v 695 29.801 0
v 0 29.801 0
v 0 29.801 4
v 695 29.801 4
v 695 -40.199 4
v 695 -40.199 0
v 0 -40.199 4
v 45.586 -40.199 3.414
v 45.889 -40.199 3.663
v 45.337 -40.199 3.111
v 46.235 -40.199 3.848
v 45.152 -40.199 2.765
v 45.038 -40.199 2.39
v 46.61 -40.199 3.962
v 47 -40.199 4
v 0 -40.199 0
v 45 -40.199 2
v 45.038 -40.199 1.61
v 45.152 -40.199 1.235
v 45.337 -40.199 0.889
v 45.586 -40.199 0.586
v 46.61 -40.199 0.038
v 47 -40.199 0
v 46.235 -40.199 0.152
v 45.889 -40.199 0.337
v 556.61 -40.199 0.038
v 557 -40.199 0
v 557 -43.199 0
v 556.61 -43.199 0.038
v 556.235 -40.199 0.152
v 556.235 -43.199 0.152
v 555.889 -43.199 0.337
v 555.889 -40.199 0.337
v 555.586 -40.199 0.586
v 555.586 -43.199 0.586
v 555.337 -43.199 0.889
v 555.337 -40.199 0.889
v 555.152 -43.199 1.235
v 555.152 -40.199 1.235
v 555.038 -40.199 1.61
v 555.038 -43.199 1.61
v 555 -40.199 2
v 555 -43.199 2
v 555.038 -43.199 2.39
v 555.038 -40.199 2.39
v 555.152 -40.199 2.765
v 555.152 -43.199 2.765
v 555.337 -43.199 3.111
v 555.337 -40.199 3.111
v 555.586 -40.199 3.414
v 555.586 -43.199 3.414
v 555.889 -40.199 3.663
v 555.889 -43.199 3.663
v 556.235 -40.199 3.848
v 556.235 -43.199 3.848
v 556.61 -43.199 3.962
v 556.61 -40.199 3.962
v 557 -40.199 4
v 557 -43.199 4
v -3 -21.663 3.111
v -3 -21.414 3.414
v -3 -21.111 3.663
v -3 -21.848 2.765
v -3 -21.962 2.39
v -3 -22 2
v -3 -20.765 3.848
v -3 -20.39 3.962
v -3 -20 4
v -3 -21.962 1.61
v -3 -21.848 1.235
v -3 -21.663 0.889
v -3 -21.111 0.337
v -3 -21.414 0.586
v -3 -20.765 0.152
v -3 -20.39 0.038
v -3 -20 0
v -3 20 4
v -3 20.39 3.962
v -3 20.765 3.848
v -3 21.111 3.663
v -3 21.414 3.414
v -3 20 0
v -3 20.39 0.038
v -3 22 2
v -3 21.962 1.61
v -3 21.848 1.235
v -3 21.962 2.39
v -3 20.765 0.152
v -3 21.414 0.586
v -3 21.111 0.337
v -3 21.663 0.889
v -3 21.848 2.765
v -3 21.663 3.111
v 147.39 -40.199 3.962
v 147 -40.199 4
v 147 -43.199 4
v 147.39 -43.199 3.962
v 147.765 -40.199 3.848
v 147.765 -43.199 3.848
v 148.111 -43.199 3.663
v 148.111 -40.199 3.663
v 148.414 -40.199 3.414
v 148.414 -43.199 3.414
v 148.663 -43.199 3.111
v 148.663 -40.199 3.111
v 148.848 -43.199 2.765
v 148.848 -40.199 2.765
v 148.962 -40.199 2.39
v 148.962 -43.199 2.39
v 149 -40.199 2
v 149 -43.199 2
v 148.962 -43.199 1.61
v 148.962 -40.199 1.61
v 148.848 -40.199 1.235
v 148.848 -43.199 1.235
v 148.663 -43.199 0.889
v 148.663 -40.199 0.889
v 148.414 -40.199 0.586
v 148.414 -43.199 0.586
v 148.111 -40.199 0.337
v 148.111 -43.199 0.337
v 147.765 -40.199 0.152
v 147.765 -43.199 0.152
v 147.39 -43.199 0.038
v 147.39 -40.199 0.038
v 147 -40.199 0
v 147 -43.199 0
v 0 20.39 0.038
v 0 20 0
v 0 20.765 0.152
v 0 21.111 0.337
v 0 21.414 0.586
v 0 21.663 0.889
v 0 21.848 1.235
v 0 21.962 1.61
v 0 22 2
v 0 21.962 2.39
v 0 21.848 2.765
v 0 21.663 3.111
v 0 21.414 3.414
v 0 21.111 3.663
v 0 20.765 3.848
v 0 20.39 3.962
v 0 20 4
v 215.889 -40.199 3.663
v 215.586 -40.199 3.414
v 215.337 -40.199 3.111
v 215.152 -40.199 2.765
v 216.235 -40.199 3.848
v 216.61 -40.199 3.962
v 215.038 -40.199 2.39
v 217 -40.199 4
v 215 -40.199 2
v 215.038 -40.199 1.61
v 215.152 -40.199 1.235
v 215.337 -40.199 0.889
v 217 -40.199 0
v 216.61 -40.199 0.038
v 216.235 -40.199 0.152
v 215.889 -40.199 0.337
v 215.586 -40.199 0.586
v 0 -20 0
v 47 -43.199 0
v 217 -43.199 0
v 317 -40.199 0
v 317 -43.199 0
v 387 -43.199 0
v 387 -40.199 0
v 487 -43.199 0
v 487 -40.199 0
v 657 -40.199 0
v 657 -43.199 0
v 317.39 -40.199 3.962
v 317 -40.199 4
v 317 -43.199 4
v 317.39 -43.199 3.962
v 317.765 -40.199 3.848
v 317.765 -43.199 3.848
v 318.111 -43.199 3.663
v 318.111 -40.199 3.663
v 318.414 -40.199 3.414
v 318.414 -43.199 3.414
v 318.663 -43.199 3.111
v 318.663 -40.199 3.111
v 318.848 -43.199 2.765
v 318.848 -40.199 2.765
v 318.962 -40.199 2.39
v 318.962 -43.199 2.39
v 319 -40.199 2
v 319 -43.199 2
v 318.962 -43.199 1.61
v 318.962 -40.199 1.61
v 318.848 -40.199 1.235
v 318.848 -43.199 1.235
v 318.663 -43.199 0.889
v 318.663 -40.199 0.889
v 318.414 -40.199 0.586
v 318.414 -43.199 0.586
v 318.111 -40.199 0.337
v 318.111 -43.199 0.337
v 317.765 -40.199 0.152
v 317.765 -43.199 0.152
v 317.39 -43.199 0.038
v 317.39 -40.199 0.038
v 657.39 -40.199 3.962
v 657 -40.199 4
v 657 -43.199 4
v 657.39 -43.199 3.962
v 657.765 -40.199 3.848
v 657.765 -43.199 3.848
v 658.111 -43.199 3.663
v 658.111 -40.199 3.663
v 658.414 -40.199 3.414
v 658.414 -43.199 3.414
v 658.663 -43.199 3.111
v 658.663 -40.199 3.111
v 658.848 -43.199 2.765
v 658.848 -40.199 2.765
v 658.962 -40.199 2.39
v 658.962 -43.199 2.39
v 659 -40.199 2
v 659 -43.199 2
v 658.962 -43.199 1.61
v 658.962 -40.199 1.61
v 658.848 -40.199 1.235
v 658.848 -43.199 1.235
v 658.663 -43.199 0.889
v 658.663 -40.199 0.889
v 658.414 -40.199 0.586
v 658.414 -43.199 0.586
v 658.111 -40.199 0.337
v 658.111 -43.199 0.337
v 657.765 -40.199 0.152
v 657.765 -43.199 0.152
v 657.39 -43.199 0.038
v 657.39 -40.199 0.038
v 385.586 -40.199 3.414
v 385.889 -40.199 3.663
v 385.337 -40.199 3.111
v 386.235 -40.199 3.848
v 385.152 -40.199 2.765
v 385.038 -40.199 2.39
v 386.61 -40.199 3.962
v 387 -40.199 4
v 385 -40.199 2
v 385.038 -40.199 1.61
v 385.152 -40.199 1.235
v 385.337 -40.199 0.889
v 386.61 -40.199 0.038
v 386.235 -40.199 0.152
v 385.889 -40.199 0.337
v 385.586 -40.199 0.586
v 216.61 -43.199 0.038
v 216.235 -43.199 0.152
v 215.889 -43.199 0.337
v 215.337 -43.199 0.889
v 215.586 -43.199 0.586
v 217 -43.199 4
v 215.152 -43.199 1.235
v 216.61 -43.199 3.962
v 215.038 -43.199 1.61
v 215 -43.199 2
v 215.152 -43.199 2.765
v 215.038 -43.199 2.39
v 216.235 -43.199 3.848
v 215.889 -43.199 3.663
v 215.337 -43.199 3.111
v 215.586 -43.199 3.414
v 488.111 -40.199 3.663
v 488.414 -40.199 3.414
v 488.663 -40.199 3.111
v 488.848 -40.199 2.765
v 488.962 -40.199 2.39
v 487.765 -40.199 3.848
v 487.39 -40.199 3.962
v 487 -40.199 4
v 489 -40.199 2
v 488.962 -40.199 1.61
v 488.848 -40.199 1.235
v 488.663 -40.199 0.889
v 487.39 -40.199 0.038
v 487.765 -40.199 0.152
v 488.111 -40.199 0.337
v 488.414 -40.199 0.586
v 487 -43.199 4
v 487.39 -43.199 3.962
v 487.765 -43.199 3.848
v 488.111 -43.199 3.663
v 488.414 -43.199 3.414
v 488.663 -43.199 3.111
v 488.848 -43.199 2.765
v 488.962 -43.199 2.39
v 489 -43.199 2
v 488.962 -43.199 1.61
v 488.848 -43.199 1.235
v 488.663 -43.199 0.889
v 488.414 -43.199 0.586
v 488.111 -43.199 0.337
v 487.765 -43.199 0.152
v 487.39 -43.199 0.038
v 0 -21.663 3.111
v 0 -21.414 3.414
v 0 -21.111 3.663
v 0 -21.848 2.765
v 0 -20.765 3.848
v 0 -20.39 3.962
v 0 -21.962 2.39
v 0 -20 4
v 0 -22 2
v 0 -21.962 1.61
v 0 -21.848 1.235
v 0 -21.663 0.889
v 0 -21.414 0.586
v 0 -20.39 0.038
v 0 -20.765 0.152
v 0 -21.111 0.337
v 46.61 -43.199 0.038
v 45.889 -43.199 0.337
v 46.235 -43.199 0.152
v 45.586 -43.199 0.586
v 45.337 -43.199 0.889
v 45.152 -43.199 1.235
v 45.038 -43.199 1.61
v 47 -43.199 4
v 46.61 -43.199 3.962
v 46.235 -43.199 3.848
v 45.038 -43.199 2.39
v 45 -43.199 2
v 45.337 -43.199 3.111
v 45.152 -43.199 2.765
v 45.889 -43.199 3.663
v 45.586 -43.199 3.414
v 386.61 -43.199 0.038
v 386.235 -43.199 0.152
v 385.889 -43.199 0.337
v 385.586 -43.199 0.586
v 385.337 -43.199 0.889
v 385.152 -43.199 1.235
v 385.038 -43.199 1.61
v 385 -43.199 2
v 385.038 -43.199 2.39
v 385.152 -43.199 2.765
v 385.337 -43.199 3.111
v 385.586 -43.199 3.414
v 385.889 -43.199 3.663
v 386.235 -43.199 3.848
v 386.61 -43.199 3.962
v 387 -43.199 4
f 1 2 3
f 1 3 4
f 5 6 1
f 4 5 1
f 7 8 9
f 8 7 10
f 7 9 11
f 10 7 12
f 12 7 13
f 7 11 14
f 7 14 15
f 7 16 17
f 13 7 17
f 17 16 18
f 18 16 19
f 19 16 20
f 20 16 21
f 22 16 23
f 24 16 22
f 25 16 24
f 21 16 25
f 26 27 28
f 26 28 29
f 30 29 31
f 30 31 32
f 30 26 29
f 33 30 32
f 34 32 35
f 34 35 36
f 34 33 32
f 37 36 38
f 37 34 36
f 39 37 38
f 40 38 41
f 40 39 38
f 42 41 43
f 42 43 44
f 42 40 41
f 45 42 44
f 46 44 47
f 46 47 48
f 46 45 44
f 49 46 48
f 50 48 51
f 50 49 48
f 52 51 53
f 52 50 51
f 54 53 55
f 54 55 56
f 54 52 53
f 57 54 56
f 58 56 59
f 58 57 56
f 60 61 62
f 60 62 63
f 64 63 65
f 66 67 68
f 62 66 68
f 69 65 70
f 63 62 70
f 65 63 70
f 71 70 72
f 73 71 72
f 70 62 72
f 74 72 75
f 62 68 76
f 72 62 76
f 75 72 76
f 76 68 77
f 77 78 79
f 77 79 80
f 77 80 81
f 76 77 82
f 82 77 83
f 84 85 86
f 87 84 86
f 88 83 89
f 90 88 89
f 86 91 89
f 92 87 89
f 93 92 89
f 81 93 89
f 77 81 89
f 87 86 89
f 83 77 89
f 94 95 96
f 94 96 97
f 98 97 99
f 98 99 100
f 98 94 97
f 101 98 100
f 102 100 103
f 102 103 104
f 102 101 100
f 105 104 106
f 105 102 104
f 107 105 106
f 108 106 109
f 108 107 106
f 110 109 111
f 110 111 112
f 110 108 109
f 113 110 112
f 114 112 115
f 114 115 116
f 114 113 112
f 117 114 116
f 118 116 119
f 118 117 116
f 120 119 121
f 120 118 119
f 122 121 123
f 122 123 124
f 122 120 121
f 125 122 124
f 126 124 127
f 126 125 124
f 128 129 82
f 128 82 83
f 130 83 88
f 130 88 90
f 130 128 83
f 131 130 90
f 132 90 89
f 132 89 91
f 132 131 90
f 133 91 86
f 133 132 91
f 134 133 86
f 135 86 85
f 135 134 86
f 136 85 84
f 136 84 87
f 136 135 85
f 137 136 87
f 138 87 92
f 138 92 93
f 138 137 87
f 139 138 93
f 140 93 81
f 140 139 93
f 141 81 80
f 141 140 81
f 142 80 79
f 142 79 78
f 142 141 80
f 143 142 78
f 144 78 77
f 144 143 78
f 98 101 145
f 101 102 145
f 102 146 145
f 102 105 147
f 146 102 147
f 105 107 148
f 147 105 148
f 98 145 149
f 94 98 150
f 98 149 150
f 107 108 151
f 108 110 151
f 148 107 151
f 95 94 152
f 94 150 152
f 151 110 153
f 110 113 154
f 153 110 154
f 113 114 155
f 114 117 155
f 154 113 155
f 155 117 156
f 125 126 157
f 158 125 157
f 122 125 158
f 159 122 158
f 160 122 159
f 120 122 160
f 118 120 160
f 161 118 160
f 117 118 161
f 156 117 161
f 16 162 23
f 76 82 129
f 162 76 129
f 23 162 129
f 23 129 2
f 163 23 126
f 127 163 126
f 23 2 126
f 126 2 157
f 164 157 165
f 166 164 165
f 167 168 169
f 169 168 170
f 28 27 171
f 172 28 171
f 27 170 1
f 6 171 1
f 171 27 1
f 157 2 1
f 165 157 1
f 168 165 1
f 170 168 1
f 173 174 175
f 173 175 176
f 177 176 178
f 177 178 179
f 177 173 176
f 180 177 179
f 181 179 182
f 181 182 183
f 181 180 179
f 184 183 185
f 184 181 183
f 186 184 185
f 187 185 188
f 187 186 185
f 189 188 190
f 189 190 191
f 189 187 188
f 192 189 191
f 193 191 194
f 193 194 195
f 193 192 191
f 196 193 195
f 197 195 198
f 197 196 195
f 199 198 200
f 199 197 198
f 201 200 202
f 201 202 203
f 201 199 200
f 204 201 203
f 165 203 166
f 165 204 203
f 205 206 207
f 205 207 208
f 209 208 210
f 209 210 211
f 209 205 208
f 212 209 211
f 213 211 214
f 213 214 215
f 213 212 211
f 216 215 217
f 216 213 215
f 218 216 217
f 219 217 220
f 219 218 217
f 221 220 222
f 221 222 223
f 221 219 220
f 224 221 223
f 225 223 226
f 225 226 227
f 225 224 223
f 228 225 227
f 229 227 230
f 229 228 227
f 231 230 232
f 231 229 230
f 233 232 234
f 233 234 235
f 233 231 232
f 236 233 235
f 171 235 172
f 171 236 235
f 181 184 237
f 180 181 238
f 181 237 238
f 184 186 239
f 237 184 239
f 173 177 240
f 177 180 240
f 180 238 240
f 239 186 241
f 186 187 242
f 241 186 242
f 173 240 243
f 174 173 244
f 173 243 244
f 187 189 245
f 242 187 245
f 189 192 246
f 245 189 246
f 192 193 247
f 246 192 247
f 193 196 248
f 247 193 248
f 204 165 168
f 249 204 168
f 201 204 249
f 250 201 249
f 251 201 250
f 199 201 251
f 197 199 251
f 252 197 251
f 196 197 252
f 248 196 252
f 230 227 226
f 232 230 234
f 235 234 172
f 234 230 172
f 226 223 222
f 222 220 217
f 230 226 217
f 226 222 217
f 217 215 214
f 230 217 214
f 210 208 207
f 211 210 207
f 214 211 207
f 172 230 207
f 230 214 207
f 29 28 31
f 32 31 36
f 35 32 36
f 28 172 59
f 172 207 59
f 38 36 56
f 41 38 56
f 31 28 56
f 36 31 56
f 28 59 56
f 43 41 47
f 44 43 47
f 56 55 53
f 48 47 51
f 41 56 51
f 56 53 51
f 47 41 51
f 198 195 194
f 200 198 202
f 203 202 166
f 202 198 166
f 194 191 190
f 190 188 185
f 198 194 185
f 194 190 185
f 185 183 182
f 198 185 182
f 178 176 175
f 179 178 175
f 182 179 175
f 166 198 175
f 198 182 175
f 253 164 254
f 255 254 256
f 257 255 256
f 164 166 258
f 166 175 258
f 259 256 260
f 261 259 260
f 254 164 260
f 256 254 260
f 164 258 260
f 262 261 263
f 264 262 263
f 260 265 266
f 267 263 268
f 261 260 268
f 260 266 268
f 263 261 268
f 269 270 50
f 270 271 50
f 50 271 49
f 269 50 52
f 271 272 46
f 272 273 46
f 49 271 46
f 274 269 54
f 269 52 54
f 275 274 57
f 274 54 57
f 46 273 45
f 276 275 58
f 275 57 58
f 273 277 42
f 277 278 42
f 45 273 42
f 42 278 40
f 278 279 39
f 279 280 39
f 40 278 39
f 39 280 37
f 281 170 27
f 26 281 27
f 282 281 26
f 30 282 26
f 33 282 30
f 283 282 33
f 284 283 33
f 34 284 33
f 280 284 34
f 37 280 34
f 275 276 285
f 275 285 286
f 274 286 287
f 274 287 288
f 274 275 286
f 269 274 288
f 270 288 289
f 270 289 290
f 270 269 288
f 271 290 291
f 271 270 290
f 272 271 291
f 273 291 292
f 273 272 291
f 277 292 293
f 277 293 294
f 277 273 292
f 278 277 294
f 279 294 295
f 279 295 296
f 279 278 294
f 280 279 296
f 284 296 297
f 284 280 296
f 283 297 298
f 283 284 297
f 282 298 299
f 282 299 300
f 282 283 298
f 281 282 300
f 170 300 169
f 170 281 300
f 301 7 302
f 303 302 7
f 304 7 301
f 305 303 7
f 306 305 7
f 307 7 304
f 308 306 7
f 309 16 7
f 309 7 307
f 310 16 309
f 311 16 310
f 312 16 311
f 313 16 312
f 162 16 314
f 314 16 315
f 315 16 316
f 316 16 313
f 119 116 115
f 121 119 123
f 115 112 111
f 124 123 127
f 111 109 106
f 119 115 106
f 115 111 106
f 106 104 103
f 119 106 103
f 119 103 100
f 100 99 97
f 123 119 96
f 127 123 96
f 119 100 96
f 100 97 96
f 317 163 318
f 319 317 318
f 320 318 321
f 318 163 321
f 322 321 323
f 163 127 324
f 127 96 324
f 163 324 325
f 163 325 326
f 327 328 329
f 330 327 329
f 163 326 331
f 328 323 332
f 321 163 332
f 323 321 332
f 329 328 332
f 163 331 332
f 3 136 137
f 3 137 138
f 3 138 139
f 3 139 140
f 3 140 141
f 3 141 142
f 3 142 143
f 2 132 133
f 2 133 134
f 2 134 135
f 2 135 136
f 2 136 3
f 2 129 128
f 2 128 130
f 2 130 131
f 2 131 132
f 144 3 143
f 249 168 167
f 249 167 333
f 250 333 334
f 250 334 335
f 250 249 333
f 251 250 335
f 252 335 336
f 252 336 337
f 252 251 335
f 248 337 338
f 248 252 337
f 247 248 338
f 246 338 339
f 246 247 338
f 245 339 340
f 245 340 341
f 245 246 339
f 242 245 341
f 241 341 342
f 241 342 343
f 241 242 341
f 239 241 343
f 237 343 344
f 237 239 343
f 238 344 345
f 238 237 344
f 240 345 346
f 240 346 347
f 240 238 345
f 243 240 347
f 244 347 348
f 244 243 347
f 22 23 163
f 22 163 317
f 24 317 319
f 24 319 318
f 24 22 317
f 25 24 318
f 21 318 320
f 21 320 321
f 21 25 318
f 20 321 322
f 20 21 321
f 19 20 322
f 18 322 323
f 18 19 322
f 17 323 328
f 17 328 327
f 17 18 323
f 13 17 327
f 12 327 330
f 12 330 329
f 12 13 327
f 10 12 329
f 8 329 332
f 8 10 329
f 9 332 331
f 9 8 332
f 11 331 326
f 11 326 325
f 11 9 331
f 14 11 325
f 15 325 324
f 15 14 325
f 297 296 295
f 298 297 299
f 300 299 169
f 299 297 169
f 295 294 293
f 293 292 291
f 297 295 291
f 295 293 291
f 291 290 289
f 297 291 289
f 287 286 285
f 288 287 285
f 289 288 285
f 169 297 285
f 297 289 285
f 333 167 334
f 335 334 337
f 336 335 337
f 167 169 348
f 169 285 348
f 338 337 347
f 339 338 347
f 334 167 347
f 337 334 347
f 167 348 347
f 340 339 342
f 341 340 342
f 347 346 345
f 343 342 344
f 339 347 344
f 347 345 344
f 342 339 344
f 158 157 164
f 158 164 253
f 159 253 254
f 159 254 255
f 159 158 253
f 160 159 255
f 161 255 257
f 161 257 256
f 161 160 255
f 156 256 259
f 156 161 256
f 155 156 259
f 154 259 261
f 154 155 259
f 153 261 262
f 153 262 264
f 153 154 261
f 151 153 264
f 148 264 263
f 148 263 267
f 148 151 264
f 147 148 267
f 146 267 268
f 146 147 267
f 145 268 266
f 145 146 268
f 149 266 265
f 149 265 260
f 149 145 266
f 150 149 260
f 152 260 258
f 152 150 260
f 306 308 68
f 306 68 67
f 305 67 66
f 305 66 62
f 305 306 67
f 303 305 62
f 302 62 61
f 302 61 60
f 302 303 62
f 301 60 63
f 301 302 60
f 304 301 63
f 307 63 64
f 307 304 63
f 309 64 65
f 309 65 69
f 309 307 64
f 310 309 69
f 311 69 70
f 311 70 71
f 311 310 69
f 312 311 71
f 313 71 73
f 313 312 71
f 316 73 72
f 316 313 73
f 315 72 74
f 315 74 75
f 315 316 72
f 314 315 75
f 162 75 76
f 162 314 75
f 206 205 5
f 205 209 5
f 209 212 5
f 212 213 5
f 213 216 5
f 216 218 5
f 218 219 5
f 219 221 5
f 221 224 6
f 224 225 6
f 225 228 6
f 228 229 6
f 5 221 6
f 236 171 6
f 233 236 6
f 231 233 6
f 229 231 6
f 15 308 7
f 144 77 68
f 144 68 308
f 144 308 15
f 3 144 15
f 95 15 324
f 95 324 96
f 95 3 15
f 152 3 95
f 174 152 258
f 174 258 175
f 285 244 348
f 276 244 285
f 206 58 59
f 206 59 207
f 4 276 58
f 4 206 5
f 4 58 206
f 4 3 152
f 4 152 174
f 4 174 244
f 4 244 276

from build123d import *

# Parameters (mm, degrees)
SKETCH_1_W      = 695
SKETCH_1_H      = 70
EXTRUDE_1_DEPTH = 4
EXTRUDE_2_DEPTH = 3
EXTRUDE_3_DEPTH = 3


with BuildPart() as part:
    # Эскиз1 → Бобышка-Вытянуть1 (new body)
    with BuildSketch(Plane.XY):
        with Locations((347.5, -5.198933607)):
            Rectangle(SKETCH_1_W, SKETCH_1_H)
    extrude(amount=EXTRUDE_1_DEPTH)

    # Эскиз2 → Бобышка-Вытянуть2 (add)
    with BuildSketch(Plane.XZ.offset(40.198933607)):
        with BuildLine():
            Line((47, 4), (147, 4))
            ThreePointArc((147, 4), (149, 2), (147, 0))
            Line((147, 0), (47, 0))
            ThreePointArc((47, 0), (45, 2), (47, 4))
        make_face()
        with BuildLine():
            Line((217, 4), (317, 4))
            ThreePointArc((317, 4), (319, 2), (317, 0))
            Line((317, 0), (217, 0))
            ThreePointArc((217, 0), (215, 2), (217, 4))
        make_face()
        with BuildLine():
            Line((387, 4), (487, 4))
            ThreePointArc((487, 4), (489, 2), (487, 0))
            Line((487, 0), (387, 0))
            ThreePointArc((387, 0), (385, 2), (387, 4))
        make_face()
        with BuildLine():
            Line((557, 4), (657, 4))
            ThreePointArc((657, 4), (659, 2), (657, 0))
            Line((657, 0), (557, 0))
            ThreePointArc((557, 0), (555, 2), (557, 4))
        make_face()
    extrude(amount=EXTRUDE_2_DEPTH)

    # Эскиз3 → Бобышка-Вытянуть3 (add)
    with BuildSketch(Plane.ZY):
        with BuildLine():
            Line((4, 20), (4, -20))
            ThreePointArc((4, -20), (2, -22), (0, -20))
            Line((0, -20), (0, 20))
            ThreePointArc((0, 20), (2, 22), (4, 20))
        make_face()
    extrude(amount=EXTRUDE_3_DEPTH)


solid = part.part
